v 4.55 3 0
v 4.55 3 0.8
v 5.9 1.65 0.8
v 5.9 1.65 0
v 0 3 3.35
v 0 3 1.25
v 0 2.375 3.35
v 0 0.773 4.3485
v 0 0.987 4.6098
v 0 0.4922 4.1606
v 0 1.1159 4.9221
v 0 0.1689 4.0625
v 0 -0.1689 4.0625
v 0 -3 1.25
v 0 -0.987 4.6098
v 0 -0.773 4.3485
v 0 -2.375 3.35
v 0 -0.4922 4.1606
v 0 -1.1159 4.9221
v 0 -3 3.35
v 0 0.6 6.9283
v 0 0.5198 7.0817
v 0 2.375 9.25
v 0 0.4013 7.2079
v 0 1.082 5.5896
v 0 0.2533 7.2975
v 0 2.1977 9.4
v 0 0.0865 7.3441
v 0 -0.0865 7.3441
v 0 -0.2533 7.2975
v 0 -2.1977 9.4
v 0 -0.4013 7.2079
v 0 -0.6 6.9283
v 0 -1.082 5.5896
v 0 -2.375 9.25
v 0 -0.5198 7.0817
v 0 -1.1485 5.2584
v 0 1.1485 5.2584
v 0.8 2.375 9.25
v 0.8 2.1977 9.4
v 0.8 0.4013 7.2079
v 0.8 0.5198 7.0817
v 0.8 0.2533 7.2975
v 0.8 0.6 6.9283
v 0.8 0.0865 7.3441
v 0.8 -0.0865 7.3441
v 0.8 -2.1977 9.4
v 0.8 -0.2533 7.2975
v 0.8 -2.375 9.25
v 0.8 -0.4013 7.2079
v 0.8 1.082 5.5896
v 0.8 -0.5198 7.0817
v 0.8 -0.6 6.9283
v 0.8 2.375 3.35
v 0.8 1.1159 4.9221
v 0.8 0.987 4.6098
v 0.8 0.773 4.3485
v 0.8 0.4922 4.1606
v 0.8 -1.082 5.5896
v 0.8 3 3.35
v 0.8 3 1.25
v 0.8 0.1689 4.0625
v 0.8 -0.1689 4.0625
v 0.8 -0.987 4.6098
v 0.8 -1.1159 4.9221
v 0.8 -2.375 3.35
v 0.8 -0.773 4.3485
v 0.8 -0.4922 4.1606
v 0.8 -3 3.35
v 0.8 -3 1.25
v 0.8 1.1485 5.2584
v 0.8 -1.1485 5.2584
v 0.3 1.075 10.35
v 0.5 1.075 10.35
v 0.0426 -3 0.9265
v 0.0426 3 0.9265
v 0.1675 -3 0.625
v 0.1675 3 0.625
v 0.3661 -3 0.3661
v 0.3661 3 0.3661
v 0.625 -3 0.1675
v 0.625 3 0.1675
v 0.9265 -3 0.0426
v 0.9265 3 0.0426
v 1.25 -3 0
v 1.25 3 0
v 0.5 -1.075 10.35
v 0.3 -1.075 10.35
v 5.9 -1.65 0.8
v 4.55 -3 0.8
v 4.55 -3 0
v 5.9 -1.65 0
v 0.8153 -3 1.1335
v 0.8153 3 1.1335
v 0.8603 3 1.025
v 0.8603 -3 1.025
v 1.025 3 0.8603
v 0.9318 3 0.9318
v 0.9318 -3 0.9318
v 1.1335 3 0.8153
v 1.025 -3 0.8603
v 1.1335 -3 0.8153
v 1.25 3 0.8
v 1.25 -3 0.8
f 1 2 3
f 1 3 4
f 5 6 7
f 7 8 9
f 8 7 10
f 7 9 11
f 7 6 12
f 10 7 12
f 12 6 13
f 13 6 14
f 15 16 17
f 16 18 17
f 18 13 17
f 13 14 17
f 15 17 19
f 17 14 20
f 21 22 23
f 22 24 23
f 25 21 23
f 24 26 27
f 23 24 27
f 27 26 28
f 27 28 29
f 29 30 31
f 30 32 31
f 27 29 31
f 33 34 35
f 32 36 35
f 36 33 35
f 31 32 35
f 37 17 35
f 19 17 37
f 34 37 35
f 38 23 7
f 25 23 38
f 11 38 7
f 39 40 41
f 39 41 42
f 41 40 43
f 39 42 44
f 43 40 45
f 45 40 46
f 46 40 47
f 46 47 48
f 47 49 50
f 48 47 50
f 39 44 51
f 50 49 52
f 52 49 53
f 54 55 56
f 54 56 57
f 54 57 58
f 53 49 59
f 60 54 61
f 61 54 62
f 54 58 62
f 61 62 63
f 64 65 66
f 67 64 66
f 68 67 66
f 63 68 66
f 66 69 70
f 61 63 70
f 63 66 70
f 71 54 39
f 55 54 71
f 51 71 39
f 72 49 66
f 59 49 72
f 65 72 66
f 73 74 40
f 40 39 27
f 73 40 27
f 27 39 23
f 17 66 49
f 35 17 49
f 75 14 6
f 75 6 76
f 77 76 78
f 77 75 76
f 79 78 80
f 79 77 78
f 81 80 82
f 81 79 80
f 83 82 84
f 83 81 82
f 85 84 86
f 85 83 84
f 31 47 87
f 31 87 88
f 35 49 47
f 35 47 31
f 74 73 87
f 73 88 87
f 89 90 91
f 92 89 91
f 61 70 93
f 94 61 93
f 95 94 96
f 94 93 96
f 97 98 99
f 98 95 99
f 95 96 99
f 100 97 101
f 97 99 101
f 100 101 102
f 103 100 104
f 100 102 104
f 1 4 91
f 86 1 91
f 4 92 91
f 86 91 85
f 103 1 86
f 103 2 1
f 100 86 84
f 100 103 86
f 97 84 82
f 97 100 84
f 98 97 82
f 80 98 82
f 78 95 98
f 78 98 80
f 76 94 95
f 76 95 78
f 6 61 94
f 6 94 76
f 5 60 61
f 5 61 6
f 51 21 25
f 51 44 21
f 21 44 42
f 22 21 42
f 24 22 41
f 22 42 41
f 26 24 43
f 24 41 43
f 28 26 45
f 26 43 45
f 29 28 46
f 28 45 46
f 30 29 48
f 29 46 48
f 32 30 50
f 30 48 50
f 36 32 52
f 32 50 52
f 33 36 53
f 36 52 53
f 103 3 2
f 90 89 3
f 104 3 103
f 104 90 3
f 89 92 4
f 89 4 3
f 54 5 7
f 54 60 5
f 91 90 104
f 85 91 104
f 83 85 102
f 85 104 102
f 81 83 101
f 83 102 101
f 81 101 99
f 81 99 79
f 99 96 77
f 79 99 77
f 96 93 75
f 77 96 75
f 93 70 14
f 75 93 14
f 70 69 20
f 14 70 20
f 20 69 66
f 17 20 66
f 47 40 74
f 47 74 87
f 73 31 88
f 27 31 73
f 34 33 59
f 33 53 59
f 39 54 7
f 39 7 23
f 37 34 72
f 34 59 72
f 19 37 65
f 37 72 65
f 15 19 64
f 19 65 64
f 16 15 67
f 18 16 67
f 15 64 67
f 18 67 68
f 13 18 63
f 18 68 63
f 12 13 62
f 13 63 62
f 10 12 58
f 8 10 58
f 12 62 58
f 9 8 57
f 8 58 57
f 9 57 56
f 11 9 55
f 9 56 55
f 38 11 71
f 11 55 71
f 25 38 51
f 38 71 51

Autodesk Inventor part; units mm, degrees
ref_plane "YZ Plane" through (0, 0, 0) normal (1, 0, 0) x (0, 1, 0)
ref_plane "XZ Plane" through (0, 0, 0) normal (0, 1, 0) x (-1, 0, 0)
ref_plane "XY Plane" through (0, 0, 0) normal (0, 0, 1) x (1, 0, 0)
sketch "Sketch1" plane through (0, 0, 0) normal (0, 1, 0) x (-1, 0, 0)
  line L0 (-5.9, 0) -> (-1.25, 0)
  line L1 (-5.9, 0) -> (-5.9, 0.8)
  line L2 (-5.9, 0.8) -> (-1.25, 0.8)
  line L3 (0, 1.25) -> (0, 10.35)
  line L4 (0, 10.35) -> (-0.8, 10.35)
  line L5 (-0.8, 10.35) -> (-0.8, 1.25)
  arc A0 (-1.25, 0) -> (0, 1.25) centre (-1.25, 1.25) ccw
  arc A1 (-1.25, 0.8) -> (-0.8, 1.25) centre (-1.25, 1.25) ccw
  point P0 (0, 0)
  dimension "d0" = 0.8
  dimension "d1" = 10.35
  dimension "d2" = 5.9
  dimension "d3" = 1.25
extrude "Extrusion1" add sketch "Sketch1" along normal mid plane 6
sketch "Sketch2" plane through (0.8, -3, 1.25) normal (1, 0, 0) x (0, 0, -1)
  line L0 (-9.1, 0) -> (-9.1, 6) projected
  arc A0 (-4.3396, 1.918) -> (-4.3396, 4.082) centre (-3.95, 3) ccw
  arc A1 (-5.6783, 3.6) -> (-5.6783, 2.4) centre (-5.4623, 3) ccw
  line L1 (-5.6783, 3.6) -> (-4.3396, 4.082)
  line L2 (-5.6783, 2.4) -> (-4.3396, 1.918)
  line L3 (1.25, 6) -> (1.25, 0) projected
  line L4 (-9.1, 6) -> (-2.1, 6)
  line L5 (-2.1, 6) -> (-2.1, 5.375)
  line L6 (-2.1, 5.375) -> (-9.1, 5.375)
  line L7 (-9.1, 5.375) -> (-9.1, 6)
  line L8 (-9.1, 0) -> (-2.1, 0)
  line L9 (-2.1, 0) -> (-2.1, 0.625)
  line L10 (-2.1, 0.625) -> (-9.1, 0.625)
  line L11 (-9.1, 0.625) -> (-9.1, 0)
  point P0 (1.25, 3)
  point P1 (1.25, 3)
  dimension "d6" = 3
  dimension "d7" = 3.3
  dimension "d8" = 1.15
  dimension "d9" = 1.2
  dimension "d27" = 4.75
  dimension "d28" = 7
extrude "Extrusion2" cut sketch "Sketch2" against normal through all
chamfer "Chamfer1" distance 1.35 angle 45 2 edges at (5.9, 3, 0.4) (5.9, -3, 0.4)
chamfer "Chamfer2" distance 1.3 distance2 1.1 1 edges at (0.4, -2.375, 10.35) measured on face at (0.2667, -0.7917, 10.35)
chamfer "Chamfer3" distance 1.3 distance2 1.1 1 edges at (0.4, 2.375, 10.35) measured on face at (0.2667, 0.075, 10.35)
chamfer "Chamfer4" distance 0.3 distance2 0.95 1 edges at (0.8, 0, 10.35) measured on face at (0.2667, -0.3583, 10.35)
chamfer "Chamfer5" distance 0.3 distance2 0.95 1 edges at (0, 0, 10.35) measured on face at (0.1667, -0.3583, 10.35)
properties material "Nickel-Copper Alloy 400"
